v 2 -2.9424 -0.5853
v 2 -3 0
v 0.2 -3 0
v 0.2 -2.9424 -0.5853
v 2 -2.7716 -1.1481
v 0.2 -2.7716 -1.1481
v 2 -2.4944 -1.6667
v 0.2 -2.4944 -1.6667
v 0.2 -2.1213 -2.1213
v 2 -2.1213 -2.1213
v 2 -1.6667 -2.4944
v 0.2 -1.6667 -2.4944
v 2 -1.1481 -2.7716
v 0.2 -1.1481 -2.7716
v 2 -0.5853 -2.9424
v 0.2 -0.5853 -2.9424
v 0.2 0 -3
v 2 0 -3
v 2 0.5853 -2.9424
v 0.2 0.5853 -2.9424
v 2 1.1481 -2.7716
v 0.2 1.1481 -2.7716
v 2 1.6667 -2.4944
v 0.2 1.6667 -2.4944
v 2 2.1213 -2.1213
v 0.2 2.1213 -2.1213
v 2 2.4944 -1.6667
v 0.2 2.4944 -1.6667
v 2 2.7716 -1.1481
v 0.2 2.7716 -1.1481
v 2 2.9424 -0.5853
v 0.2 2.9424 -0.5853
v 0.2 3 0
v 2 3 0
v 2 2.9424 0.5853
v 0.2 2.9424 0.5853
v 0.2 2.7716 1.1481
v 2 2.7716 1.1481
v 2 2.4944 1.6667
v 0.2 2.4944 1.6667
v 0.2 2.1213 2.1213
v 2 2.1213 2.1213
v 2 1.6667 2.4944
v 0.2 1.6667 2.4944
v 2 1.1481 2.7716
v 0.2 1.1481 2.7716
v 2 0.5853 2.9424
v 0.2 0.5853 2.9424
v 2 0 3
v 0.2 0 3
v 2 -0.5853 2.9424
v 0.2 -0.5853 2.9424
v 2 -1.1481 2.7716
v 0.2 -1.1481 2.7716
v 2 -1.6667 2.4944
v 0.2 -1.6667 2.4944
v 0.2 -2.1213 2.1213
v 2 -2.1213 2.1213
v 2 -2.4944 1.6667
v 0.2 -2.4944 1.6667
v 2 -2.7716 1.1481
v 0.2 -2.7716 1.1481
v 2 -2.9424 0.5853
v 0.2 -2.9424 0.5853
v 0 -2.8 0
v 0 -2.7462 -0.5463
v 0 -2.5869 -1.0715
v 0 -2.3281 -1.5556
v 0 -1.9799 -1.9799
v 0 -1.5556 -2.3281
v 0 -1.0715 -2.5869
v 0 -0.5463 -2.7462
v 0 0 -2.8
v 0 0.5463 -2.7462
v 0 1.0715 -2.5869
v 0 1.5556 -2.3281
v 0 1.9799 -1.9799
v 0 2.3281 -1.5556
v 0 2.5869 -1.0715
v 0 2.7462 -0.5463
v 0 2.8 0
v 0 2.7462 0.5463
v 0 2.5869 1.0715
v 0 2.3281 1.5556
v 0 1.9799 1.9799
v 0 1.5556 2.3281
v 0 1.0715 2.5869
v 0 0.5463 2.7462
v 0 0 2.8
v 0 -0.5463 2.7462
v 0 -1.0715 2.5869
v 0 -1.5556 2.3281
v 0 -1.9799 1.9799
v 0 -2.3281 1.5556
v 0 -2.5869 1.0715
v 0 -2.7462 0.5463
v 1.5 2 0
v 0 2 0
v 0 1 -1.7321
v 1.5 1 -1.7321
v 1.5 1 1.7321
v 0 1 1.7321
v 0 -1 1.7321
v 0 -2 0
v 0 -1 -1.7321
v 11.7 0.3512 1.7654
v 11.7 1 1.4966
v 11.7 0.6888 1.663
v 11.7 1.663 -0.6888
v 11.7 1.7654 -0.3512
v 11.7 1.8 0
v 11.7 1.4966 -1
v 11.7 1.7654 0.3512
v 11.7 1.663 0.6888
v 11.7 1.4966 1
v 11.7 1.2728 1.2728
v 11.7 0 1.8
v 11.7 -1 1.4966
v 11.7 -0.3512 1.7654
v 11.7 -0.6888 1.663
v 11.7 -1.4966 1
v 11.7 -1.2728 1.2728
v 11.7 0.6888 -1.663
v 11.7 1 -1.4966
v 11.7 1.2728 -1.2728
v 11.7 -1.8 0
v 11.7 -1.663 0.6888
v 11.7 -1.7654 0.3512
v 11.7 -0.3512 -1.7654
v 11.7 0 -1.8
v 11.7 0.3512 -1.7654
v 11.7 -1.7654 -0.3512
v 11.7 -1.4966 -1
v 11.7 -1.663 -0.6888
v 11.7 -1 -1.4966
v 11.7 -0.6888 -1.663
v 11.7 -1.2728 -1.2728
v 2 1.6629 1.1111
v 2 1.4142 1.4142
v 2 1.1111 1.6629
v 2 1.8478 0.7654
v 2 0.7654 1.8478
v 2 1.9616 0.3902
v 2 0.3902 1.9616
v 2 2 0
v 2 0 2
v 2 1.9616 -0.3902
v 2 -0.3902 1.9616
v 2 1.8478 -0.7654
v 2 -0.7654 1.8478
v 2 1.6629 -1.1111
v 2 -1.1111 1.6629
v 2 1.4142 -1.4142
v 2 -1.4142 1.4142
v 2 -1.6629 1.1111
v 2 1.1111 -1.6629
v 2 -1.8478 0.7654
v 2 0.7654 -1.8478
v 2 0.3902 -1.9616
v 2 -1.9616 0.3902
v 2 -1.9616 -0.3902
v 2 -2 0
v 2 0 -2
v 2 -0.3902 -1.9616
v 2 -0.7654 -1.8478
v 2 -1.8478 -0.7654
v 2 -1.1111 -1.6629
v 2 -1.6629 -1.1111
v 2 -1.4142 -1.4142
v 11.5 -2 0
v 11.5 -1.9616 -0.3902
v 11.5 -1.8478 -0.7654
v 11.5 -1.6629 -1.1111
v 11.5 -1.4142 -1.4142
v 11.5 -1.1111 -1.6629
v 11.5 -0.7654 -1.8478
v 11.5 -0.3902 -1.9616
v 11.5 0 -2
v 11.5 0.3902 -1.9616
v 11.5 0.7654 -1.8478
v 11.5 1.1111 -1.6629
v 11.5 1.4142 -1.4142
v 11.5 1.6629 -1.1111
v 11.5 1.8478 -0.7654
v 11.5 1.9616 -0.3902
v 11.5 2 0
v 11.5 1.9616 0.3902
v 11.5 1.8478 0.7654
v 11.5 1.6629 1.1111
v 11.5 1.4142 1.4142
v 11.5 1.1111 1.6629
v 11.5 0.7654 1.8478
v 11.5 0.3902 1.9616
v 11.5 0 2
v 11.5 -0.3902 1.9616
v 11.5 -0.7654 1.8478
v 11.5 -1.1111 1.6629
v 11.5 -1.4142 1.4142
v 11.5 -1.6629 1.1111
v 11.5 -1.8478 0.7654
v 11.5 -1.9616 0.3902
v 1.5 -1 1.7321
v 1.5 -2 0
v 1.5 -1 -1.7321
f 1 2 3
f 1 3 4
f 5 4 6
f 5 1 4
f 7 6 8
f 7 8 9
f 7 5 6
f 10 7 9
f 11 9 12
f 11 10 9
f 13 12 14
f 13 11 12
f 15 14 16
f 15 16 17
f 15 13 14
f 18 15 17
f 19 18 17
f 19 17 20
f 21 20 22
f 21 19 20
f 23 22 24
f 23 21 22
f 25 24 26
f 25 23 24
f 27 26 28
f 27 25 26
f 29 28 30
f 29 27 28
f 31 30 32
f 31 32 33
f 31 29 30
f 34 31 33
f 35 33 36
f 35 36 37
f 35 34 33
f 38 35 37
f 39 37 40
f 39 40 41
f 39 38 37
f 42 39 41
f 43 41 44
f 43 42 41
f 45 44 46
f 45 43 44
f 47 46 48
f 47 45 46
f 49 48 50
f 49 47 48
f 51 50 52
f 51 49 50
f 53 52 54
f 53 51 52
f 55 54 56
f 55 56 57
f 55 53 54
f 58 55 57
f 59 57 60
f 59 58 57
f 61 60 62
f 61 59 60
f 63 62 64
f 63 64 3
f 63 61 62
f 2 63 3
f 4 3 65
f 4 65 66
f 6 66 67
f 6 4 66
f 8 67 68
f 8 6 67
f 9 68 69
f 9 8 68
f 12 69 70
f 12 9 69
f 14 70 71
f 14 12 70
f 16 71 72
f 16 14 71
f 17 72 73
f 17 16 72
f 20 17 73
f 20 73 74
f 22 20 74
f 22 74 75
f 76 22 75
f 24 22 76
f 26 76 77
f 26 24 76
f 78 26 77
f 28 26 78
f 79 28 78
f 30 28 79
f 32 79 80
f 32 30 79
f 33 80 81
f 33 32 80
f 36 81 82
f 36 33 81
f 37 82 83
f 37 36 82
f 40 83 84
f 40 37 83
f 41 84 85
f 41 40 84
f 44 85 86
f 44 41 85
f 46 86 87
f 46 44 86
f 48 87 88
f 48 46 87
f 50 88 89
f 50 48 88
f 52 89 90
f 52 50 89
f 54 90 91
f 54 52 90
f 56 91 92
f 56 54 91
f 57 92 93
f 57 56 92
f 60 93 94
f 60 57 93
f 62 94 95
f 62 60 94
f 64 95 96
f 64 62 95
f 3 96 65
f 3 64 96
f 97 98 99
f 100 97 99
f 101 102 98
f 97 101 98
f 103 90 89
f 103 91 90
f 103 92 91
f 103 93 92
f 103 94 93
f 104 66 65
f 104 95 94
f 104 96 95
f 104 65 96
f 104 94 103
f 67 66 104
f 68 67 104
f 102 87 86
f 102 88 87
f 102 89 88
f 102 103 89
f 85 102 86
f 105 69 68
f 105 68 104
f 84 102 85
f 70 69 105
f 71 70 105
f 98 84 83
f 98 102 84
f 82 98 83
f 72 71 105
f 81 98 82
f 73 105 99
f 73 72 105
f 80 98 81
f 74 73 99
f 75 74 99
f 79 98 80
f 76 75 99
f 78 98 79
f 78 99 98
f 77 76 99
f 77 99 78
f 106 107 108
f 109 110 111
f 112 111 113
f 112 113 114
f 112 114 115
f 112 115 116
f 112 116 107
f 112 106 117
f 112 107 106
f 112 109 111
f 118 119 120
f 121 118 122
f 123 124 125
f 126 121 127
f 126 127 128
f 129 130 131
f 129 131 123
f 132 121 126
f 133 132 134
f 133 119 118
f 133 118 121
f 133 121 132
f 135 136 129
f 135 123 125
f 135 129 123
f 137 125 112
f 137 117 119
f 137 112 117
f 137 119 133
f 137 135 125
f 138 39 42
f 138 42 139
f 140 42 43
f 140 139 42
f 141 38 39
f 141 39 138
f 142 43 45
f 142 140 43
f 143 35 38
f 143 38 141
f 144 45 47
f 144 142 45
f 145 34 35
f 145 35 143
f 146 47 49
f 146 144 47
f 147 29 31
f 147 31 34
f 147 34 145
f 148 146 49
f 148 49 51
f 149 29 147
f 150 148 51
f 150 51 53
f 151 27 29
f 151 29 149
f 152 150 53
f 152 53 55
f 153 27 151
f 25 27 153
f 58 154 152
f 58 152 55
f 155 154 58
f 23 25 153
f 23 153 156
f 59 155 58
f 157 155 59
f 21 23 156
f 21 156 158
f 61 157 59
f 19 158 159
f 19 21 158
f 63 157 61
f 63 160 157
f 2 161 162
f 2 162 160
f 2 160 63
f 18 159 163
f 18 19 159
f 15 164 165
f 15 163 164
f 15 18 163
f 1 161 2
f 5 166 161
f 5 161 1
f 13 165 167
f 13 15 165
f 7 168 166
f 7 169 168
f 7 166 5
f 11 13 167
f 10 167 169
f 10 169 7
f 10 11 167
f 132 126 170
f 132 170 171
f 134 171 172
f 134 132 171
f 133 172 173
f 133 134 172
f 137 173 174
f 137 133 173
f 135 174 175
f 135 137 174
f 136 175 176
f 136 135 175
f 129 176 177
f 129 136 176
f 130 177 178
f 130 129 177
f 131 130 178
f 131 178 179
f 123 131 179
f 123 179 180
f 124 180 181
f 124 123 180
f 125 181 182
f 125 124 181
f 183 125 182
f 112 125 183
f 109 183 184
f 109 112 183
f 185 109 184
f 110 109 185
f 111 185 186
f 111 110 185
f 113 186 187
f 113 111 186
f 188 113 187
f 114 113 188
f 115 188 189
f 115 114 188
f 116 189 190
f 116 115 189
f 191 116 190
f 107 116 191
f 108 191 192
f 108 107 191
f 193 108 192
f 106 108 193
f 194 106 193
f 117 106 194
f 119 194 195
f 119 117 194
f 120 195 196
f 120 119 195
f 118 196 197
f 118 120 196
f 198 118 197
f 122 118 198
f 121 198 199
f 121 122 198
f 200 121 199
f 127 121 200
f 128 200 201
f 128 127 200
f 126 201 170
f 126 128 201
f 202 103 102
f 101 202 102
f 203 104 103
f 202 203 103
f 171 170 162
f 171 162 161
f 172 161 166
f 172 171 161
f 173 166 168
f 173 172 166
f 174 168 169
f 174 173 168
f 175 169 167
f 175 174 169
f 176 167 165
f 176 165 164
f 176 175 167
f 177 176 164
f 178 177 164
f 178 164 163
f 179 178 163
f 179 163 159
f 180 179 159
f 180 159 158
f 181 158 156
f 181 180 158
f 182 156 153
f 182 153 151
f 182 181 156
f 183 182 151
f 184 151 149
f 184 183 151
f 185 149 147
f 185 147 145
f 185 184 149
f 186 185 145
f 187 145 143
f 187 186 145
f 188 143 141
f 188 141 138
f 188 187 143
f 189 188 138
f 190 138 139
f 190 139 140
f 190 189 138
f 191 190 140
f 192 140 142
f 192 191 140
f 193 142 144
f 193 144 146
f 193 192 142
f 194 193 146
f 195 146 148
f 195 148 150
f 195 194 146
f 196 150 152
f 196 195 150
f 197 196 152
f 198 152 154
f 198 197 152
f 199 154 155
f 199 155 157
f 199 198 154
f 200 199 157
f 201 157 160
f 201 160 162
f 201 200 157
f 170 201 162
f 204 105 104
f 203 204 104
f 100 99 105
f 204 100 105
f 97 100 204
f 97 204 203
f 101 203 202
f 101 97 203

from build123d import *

# Parameters (mm, degrees)
CUT_EXTRUDE1_DEPTH = 1.5
CHAMFER1_SIZE      = 0.2


with BuildPart() as part:
    # Sketch1 → Revolve1 (revolve)
    with BuildSketch(Plane.XY, mode=Mode.PRIVATE) as revolve1_sk:
        Polygon((0, 0), (0, 3), (2, 3), (2, 2), (11.7, 2), (11.7, 0), align=None)
    revolve(revolve1_sk.sketch.rotate(Axis((0, 0, 0), (1, 0, 0)), 180), axis=Axis((0, 0, 0), (1, 0, 0)))

    # Sketch2 → Cut-Extrude1 (cut)
    with BuildSketch(Plane.ZY):
        Polygon((0, 2), (-1.732050808, 1), (-1.732050808, -1), (0, -2), (1.732050808, -1), (1.732050808, 1), align=None)
    extrude(amount=-CUT_EXTRUDE1_DEPTH, mode=Mode.SUBTRACT)

    # Chamfer1
    chamfer1_edges = [part.edges().sort_by_distance(p)[0] for p in [
        (11.7, 2, 0),
        (0, 3, 0),
    ]]
    chamfer(chamfer1_edges, length=CHAMFER1_SIZE)


solid = part.part
